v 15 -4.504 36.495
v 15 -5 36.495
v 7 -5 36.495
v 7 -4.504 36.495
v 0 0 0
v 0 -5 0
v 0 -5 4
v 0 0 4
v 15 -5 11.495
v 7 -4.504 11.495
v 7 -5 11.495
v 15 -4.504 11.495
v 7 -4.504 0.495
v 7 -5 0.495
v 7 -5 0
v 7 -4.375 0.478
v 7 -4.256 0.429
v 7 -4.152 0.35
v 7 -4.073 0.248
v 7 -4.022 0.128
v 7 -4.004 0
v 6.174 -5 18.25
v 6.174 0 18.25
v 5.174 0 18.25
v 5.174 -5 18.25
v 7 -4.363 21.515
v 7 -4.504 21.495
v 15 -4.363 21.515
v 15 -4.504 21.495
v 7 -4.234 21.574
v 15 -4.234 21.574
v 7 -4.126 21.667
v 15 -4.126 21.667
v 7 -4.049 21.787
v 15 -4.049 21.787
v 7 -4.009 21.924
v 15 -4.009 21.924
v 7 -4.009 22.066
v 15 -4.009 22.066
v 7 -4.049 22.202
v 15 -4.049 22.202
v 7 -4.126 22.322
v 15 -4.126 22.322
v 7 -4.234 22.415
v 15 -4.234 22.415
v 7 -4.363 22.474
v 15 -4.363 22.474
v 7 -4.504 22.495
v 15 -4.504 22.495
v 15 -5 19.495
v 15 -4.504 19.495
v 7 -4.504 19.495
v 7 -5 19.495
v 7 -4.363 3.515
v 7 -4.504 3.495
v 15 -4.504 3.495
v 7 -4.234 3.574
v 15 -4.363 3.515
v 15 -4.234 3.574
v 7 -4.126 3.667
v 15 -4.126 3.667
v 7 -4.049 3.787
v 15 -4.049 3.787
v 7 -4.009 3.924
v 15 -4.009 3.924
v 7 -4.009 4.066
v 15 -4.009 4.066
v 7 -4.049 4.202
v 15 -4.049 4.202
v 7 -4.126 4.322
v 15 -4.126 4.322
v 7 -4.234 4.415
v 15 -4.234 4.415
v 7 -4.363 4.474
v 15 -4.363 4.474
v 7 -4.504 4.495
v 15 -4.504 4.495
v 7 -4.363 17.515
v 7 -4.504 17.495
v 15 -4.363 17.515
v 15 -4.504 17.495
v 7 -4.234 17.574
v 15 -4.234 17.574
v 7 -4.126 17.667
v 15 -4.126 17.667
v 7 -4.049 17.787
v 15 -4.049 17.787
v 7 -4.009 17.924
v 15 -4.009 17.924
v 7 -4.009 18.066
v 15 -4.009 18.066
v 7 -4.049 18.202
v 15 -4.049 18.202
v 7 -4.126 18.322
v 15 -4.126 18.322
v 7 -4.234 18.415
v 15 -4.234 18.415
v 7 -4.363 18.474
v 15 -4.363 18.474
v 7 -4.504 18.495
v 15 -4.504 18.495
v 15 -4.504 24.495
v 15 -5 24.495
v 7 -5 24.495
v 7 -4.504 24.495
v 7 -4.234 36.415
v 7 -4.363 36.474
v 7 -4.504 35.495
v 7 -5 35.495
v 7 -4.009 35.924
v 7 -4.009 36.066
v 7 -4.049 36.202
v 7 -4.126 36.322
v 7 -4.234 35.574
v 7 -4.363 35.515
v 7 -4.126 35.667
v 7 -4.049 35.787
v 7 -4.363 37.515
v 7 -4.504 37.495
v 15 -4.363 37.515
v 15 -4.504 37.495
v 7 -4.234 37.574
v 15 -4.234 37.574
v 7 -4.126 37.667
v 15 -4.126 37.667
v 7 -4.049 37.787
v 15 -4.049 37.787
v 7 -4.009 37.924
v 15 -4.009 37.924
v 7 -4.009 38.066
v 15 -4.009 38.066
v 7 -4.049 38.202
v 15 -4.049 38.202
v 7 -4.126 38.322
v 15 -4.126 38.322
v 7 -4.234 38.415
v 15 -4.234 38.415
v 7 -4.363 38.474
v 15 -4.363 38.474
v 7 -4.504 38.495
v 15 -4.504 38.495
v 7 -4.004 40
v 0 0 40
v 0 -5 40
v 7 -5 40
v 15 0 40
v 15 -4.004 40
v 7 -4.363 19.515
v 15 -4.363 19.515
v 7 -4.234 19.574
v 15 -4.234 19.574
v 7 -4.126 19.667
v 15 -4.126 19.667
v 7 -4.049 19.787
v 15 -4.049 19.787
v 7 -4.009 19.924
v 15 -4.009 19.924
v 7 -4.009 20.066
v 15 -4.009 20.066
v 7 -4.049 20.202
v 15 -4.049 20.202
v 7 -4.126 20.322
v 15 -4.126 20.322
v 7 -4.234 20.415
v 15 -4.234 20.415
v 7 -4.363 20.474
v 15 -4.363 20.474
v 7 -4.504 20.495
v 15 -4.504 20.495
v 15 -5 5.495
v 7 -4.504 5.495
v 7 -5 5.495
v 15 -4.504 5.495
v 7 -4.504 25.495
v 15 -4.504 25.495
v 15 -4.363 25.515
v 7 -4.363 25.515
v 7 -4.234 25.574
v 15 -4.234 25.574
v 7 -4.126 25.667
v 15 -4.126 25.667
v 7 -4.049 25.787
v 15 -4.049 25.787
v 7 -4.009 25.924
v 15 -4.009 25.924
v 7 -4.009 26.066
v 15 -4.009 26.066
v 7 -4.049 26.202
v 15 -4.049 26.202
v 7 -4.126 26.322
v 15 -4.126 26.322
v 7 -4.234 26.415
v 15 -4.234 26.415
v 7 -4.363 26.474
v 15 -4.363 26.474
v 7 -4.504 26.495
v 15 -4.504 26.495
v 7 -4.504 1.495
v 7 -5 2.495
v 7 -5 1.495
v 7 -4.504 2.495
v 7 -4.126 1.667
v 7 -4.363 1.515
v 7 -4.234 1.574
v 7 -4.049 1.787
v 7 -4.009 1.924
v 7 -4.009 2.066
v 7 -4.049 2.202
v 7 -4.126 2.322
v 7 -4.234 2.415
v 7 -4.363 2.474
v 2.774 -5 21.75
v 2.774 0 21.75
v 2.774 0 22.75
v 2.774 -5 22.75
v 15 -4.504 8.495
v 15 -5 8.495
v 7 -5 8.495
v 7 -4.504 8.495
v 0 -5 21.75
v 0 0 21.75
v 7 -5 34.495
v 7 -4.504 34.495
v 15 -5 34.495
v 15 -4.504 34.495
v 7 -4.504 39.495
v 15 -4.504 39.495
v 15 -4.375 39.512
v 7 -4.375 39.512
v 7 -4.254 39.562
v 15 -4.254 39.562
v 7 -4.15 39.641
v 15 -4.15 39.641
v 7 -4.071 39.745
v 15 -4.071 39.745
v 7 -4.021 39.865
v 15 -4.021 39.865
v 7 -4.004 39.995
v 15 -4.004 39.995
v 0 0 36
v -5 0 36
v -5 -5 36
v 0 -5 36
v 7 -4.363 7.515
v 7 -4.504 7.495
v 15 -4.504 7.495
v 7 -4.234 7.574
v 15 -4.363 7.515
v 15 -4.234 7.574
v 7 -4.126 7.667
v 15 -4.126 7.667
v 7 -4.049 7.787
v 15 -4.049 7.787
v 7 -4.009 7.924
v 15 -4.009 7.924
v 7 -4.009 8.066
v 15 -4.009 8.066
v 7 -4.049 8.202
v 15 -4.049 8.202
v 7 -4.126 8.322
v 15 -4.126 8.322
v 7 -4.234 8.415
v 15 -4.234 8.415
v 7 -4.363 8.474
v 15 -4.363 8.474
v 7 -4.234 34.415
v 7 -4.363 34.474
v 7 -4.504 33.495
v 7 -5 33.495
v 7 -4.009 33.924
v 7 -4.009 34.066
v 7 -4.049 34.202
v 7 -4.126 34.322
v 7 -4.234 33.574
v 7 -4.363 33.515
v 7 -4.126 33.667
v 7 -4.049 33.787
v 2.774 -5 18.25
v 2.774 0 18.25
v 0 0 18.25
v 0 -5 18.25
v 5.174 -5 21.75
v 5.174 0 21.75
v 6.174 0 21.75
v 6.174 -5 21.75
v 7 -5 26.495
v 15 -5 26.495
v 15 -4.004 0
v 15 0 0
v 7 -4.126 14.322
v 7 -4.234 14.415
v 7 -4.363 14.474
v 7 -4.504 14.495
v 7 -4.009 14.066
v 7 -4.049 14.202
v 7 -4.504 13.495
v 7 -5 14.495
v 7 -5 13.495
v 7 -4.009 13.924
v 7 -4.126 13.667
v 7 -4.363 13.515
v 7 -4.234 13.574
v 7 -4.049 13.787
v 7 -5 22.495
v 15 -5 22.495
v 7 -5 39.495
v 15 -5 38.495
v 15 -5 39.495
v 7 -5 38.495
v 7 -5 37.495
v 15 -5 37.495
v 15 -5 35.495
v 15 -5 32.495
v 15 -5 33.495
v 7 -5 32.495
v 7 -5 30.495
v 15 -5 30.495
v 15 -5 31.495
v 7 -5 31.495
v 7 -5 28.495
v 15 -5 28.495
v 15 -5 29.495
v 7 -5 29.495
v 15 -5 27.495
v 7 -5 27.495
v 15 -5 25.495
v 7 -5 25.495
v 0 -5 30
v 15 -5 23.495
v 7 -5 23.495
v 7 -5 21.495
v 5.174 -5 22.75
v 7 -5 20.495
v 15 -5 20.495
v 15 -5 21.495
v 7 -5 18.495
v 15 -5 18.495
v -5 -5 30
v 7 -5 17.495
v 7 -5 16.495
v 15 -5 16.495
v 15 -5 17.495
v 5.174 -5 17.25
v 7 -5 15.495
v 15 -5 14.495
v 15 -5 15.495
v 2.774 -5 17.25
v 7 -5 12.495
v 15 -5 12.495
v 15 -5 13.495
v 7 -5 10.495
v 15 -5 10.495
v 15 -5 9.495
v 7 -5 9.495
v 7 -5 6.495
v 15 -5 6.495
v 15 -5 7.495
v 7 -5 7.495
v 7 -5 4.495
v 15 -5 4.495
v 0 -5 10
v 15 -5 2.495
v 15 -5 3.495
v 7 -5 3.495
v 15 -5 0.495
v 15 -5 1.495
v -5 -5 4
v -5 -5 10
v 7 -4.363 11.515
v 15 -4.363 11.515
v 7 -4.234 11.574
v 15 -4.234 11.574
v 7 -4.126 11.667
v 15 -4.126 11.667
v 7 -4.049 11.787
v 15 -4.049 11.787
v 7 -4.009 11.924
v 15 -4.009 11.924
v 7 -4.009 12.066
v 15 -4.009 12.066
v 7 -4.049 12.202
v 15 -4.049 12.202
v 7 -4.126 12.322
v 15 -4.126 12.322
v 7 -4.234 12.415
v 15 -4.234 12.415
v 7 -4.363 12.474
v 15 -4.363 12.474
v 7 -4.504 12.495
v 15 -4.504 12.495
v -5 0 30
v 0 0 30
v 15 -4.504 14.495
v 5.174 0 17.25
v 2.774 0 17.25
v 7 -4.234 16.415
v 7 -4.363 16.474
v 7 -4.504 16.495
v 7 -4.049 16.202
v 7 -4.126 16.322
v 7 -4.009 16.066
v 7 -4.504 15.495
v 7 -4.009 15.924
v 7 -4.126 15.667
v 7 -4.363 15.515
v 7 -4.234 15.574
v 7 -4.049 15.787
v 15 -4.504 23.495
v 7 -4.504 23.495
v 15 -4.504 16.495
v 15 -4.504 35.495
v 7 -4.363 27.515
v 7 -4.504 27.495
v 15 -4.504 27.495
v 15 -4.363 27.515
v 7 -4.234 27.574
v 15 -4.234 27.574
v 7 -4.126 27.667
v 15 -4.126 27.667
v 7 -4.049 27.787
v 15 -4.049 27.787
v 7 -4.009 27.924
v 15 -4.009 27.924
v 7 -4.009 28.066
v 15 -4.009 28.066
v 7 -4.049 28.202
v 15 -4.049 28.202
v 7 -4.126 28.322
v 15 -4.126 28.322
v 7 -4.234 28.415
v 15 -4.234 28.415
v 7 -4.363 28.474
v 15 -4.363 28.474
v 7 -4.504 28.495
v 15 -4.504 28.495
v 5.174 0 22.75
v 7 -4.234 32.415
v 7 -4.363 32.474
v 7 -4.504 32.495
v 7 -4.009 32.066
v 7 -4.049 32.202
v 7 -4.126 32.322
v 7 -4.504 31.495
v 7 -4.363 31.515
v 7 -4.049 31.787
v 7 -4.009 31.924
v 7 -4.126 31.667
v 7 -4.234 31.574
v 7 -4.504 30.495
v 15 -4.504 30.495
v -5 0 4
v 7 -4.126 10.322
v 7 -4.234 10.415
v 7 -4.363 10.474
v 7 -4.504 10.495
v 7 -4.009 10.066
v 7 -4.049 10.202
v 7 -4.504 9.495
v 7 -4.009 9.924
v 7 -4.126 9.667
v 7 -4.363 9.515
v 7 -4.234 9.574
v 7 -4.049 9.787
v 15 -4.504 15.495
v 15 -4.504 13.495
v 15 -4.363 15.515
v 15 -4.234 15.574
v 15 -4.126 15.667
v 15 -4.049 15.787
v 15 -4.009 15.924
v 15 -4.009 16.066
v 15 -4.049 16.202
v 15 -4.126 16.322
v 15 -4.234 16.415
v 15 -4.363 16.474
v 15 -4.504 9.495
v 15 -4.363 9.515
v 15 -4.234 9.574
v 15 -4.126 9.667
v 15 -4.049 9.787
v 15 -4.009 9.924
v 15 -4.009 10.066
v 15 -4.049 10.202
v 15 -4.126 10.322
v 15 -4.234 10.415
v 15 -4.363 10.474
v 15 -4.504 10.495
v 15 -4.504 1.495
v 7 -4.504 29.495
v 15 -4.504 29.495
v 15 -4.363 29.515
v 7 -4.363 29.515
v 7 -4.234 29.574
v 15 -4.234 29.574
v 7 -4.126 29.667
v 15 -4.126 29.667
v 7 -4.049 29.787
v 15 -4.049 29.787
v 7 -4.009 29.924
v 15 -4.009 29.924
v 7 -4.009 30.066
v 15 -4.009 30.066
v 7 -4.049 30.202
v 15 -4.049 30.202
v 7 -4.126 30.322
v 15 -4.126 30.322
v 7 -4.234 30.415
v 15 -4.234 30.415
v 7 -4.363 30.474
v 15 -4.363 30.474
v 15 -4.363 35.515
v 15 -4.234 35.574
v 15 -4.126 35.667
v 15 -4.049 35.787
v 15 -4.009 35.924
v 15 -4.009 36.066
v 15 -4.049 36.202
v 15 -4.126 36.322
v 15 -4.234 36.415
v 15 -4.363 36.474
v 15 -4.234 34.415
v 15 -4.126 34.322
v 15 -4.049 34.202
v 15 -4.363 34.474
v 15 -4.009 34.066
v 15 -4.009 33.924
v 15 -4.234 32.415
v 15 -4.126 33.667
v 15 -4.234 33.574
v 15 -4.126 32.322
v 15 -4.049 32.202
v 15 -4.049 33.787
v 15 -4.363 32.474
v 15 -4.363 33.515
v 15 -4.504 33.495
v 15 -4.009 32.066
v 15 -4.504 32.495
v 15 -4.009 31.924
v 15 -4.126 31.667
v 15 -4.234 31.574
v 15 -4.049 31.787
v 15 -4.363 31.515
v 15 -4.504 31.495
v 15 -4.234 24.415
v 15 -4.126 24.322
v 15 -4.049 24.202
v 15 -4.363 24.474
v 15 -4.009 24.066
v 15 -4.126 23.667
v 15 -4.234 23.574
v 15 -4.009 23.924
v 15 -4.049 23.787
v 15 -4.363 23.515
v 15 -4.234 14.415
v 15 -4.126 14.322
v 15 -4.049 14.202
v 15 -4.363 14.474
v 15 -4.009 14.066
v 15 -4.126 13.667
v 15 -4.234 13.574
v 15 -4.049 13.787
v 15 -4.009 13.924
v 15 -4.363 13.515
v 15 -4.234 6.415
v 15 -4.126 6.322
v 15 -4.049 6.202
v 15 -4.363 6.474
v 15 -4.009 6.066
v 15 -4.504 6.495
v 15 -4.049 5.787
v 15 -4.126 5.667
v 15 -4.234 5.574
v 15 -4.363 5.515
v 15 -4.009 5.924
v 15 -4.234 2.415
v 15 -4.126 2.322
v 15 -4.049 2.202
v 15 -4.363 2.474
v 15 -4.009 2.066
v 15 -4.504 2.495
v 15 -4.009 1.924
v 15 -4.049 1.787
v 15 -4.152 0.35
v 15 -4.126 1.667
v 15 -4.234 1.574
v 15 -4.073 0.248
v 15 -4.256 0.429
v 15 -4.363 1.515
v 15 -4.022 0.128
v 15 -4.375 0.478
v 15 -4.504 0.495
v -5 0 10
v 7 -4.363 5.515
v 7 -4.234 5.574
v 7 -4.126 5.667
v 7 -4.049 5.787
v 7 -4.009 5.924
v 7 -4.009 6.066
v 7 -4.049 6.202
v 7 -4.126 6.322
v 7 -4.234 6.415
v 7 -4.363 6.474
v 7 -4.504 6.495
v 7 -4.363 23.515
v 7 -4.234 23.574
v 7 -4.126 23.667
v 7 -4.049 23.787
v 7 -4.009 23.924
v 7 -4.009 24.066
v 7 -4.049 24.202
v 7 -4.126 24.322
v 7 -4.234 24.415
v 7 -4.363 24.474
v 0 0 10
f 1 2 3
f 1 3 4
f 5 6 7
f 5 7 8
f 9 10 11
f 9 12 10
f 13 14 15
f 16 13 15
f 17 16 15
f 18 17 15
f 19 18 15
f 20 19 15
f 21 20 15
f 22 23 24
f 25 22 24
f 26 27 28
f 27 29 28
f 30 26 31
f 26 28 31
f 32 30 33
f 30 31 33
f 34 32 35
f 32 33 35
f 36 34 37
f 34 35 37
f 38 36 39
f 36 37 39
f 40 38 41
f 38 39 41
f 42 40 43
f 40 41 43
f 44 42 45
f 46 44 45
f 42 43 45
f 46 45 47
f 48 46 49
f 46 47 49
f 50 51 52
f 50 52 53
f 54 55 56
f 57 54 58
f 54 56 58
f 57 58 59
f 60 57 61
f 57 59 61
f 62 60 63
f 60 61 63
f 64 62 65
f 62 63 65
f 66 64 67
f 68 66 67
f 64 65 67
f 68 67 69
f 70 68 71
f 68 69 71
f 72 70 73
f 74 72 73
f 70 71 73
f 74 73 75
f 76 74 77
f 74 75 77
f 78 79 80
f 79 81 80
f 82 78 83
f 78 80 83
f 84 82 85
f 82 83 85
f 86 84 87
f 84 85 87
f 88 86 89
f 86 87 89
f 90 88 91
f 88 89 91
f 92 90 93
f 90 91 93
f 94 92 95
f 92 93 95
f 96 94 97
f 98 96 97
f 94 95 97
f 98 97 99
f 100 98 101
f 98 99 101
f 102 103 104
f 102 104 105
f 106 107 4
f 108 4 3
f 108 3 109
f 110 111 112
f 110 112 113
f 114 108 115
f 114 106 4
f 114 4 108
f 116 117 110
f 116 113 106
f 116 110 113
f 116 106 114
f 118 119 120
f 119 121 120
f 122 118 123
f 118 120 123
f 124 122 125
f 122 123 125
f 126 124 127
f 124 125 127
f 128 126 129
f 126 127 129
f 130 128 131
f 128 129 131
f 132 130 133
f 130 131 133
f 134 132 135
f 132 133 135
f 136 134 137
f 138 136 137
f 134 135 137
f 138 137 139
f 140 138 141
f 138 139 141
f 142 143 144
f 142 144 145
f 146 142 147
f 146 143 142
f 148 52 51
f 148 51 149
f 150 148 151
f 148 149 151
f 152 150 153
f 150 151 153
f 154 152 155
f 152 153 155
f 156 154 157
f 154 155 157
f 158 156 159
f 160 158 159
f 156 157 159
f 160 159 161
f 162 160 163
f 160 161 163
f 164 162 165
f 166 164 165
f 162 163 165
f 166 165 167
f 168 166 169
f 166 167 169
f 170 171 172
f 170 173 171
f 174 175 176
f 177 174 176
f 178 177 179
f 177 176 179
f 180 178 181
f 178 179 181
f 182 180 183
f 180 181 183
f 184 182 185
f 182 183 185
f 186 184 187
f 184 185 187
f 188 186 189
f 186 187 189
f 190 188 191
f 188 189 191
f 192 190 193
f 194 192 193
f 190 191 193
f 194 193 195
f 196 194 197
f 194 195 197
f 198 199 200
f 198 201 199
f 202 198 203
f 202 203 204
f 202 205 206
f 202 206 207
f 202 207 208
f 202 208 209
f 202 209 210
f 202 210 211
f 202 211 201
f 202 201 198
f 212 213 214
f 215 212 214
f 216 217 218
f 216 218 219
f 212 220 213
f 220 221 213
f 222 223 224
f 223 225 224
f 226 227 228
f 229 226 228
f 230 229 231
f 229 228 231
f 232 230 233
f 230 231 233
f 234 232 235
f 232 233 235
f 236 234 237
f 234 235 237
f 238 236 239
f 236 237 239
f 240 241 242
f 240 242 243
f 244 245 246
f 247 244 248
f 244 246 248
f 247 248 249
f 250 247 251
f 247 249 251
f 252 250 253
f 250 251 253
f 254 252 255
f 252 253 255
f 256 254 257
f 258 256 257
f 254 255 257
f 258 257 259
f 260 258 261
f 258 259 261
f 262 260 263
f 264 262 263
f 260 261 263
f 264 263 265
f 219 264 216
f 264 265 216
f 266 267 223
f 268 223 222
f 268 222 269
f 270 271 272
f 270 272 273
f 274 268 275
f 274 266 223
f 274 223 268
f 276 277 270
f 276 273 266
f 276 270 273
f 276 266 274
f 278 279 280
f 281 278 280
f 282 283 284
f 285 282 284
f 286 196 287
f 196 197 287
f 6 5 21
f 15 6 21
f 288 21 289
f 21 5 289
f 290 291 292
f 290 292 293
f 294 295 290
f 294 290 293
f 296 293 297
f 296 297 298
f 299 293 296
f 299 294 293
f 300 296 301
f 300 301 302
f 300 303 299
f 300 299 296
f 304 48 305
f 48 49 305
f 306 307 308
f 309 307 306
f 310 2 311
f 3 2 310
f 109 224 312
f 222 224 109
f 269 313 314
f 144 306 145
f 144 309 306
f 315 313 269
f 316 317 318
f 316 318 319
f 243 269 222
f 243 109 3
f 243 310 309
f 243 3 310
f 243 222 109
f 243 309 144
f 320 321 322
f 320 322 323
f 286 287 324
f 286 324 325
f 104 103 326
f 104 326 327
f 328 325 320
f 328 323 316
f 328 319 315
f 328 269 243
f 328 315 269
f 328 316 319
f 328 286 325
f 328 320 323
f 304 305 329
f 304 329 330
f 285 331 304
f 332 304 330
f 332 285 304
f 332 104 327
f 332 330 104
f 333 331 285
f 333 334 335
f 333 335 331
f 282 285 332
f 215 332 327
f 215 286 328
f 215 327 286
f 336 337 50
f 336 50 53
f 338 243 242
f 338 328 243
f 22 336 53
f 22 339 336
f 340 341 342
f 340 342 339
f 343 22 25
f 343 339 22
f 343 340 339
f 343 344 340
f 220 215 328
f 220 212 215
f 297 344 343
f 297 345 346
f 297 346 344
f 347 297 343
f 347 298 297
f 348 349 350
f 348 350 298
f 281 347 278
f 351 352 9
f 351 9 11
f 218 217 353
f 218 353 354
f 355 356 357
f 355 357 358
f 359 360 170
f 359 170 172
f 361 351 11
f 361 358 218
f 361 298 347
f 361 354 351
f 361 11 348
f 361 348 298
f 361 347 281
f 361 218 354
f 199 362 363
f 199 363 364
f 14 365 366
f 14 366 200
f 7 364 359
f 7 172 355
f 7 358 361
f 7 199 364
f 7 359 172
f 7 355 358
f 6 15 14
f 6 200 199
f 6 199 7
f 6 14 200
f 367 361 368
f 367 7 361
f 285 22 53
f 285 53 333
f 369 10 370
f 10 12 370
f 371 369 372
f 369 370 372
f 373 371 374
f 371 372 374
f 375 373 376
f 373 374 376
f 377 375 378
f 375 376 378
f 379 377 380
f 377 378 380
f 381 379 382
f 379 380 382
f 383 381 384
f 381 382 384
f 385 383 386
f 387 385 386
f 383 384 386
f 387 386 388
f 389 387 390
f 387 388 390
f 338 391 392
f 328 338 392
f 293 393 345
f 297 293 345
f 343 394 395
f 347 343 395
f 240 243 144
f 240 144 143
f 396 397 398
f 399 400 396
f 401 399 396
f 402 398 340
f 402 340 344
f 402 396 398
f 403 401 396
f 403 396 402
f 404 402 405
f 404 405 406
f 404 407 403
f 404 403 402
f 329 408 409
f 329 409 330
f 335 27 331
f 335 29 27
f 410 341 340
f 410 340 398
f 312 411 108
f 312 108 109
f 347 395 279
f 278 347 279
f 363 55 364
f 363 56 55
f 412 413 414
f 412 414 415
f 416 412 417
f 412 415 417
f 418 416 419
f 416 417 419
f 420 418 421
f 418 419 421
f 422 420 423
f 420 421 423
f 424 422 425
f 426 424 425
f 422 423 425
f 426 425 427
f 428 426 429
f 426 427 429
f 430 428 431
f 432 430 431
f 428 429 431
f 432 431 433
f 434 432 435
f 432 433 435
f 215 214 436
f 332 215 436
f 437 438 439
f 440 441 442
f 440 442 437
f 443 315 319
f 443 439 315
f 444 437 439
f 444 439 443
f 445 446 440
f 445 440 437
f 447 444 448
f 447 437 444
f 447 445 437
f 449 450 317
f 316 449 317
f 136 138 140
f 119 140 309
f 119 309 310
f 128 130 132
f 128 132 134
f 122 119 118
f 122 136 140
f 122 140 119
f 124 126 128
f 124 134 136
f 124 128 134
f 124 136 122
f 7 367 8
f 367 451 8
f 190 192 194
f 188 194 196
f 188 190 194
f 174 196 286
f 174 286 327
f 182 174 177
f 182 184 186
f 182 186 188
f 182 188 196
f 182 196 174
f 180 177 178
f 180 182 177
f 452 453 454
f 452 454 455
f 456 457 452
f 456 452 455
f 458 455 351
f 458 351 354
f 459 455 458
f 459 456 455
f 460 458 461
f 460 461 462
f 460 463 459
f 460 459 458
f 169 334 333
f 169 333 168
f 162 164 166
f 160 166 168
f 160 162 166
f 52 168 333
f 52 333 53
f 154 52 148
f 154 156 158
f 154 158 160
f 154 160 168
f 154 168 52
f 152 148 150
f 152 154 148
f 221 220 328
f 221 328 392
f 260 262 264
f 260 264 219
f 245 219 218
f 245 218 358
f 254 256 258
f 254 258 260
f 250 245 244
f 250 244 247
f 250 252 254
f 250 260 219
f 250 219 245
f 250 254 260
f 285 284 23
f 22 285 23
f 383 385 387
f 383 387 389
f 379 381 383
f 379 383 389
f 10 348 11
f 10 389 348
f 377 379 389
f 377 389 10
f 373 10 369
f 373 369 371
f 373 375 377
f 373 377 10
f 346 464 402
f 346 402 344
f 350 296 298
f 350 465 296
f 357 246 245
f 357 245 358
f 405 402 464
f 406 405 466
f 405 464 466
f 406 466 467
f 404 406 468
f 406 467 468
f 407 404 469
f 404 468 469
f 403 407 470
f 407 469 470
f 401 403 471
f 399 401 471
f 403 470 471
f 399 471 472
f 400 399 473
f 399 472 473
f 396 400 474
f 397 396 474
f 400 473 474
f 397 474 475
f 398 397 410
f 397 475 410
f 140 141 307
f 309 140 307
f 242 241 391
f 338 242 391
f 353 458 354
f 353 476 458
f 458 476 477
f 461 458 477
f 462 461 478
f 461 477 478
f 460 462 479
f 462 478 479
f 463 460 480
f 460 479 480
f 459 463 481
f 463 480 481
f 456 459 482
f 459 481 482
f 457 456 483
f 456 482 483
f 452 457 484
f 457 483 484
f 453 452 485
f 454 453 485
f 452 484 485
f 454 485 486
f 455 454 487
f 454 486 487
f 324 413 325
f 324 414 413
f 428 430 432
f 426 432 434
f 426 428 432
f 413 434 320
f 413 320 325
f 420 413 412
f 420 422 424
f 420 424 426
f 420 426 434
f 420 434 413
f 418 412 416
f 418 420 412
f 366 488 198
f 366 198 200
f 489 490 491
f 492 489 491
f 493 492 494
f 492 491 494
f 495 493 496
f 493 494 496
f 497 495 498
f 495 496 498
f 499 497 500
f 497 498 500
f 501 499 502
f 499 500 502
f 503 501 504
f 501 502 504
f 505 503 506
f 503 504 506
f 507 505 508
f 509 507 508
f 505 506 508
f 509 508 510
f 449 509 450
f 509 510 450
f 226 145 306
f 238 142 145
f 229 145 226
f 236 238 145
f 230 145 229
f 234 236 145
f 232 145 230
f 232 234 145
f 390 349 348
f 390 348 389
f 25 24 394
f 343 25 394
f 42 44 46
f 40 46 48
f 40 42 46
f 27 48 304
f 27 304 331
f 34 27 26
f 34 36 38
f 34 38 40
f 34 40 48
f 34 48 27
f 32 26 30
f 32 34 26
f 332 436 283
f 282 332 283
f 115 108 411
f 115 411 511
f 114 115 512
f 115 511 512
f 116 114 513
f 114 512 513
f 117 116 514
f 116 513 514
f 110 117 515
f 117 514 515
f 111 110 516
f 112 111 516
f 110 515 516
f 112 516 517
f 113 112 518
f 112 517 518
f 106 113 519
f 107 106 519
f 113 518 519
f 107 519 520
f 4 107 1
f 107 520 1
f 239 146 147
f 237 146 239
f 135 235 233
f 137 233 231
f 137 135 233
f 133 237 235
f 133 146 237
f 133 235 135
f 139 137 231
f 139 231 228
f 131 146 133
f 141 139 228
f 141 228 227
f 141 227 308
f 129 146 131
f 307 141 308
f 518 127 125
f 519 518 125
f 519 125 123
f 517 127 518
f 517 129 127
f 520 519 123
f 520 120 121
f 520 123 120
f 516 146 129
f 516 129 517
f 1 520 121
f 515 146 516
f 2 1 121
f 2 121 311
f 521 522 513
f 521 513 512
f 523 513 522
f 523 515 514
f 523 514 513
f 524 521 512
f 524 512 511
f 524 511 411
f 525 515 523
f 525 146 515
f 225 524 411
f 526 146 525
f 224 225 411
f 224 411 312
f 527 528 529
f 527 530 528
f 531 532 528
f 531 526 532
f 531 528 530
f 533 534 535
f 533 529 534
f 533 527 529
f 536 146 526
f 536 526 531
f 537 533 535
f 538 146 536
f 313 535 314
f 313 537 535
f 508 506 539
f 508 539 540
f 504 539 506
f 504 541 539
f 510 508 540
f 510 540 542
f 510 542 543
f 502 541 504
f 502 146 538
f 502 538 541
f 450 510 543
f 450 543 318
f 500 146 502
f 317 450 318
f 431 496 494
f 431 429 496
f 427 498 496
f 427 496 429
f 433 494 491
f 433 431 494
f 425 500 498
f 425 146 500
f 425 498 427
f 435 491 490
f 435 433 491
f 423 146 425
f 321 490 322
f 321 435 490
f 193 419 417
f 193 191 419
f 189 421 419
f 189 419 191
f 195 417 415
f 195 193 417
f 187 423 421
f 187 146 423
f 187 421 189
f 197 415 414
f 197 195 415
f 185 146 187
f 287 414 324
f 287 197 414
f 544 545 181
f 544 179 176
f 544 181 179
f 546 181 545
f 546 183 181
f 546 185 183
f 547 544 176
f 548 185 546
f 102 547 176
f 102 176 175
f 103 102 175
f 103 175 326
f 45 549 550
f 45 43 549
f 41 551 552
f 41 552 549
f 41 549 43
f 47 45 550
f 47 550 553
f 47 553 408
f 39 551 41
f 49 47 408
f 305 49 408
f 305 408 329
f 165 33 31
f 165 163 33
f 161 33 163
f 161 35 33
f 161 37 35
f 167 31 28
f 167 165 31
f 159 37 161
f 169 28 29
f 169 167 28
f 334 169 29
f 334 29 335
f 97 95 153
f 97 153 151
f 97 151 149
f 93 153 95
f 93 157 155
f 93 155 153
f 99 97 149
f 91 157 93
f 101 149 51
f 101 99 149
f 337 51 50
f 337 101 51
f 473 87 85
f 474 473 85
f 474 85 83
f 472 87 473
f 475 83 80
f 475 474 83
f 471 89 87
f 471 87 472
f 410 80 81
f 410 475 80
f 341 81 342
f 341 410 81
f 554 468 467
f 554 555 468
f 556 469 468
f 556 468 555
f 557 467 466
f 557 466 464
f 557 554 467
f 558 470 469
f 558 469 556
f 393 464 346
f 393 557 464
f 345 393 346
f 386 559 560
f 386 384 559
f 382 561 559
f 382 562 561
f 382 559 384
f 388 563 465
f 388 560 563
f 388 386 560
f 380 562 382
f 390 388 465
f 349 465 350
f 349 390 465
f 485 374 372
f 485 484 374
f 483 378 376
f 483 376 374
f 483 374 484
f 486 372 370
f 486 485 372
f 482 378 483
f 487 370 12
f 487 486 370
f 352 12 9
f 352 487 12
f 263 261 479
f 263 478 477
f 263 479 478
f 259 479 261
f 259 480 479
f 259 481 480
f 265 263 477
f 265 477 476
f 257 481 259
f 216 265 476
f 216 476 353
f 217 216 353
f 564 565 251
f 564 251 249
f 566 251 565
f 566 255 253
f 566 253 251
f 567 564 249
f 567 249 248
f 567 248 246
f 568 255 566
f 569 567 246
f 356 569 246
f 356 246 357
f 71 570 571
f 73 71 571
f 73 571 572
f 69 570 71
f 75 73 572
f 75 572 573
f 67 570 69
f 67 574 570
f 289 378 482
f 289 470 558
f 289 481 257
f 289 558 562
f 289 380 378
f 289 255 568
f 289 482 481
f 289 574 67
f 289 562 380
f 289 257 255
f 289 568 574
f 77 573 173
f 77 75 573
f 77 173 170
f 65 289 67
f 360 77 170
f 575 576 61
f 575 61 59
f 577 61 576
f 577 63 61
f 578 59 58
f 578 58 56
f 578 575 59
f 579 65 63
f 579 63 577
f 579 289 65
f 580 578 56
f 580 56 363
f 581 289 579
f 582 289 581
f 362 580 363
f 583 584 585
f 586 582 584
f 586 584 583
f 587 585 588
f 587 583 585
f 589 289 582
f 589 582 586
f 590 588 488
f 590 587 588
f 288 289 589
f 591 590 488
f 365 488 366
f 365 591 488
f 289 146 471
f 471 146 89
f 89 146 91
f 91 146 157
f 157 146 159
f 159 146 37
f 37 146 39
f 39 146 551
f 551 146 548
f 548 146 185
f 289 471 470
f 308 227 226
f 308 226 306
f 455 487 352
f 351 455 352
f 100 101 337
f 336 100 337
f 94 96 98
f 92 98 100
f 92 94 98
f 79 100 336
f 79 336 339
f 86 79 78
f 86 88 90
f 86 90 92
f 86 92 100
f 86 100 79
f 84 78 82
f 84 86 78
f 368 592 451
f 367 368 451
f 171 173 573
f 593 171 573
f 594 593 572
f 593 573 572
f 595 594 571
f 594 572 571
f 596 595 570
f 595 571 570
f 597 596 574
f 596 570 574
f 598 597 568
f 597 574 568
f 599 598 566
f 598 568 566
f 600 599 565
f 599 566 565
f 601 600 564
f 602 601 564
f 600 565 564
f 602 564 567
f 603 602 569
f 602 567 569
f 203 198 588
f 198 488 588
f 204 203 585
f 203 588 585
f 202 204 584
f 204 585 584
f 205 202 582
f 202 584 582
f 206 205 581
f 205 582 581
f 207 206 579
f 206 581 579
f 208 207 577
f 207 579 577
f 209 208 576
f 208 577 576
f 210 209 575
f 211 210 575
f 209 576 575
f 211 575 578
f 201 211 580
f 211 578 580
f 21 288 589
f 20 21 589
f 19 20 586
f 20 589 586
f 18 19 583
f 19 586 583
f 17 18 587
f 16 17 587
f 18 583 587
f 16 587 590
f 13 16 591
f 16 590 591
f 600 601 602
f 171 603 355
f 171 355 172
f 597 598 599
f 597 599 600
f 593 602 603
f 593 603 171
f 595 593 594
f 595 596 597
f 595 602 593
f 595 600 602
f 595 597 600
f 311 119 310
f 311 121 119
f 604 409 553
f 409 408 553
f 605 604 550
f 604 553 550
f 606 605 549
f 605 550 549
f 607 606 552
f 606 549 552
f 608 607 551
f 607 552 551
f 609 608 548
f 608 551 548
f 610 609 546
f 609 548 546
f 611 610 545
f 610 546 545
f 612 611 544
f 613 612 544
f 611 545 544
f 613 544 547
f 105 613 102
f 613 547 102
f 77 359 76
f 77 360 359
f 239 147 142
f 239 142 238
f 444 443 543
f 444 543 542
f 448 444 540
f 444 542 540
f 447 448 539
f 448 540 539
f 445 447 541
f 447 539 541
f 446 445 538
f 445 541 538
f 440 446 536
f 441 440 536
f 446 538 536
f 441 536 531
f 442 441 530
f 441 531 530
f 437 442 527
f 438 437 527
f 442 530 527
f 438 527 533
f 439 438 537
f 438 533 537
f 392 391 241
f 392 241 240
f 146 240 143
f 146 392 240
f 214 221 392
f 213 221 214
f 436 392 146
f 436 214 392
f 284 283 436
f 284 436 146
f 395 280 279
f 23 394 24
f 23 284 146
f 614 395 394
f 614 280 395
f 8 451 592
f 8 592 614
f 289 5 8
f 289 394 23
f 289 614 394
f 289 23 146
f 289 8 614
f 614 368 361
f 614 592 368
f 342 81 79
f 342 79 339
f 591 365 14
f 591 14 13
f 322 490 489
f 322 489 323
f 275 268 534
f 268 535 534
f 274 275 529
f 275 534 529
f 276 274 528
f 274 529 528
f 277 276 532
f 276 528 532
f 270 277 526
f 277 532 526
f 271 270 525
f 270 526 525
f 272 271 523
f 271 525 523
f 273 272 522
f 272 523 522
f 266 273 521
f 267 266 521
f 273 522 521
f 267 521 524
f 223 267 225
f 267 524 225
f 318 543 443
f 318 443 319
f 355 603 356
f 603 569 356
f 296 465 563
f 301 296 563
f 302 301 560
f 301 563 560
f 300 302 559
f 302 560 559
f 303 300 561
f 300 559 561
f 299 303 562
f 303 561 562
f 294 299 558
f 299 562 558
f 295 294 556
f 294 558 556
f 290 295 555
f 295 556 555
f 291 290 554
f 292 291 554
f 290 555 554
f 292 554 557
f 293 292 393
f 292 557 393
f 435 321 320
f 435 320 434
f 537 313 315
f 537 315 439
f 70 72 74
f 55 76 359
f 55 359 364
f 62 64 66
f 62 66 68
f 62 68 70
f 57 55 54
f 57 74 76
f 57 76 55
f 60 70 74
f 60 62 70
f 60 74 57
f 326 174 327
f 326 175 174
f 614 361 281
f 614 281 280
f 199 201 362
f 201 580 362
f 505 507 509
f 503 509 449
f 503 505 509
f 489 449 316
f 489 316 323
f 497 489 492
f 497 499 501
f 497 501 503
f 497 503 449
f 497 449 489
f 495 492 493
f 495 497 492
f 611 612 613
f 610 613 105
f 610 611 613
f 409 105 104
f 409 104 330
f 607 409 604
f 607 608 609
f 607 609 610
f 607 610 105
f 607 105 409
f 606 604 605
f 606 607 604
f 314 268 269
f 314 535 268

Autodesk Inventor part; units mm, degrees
ref_plane "YZ Plane" through (0, 0, 0) normal (1, 0, 0) x (0, 1, 0)
ref_plane "XZ Plane" through (0, 0, 0) normal (0, 1, 0) x (-1, 0, 0)
ref_plane "XY Plane" through (0, 0, 0) normal (0, 0, 1) x (1, 0, 0)
sketch "Boceto1" plane through (0, 0, 0) normal (0, 0, 1) x (1, 0, 0)
  line L0 (0, 0) -> (15, 0)
  line L1 (15, 0) -> (15, -5)
  line L2 (15, -5) -> (0, -5)
  line L3 (0, -5) -> (0, 0)
extrude "Extrusión1" add sketch "Boceto1" along normal blind 40
sketch "Boceto2" plane through (0, 0, 0) normal (0, 1, 0) x (1, 0, 0)
  line L0 (0, -40) -> (15, -40) projected
  line L1 (6.174, -21.75) -> (6.174, -18.25)
  line L2 (2.774, -22.75) -> (5.174, -22.75)
  line L3 (5.174, -17.25) -> (2.774, -17.25)
  line L4 (6.174, -18.25) -> (5.174, -18.25)
  line L5 (2.774, -18.25) -> (0, -18.25)
  line L6 (2.774, -17.25) -> (2.774, -18.25)
  line L7 (2.774, -21.75) -> (2.774, -22.75)
  line L8 (5.174, -22.75) -> (5.174, -21.75)
  line L9 (5.174, -18.25) -> (5.174, -17.25)
  line L10 (0, -21.75) -> (2.774, -21.75)
  line L11 (5.174, -21.75) -> (6.174, -21.75)
  line L12 (0, -10) -> (-5, -10)
  line L13 (-5, -10) -> (-5, -4)
  line L14 (-5, -4) -> (0, -4)
  line L15 (0, -4) -> (0, -10)
  line L16 (0, -36) -> (-5, -36)
  line L17 (-5, -36) -> (-5, -30)
  line L18 (-5, -30) -> (0, -30)
  line L19 (0, -30) -> (0, -36)
  line L20 (0, 0) -> (0, -40) projected
  dimension "d7" = 3.5
  dimension "d8" = 2.4
  dimension "d12" = 18.25
  dimension "d14" = 6
  dimension "d15" = 5
  dimension "d16" = 5
  dimension "d17" = 6
  dimension "d18" = 4
  dimension "d19" = 20
extrude "Extrusión3" cut sketch "Boceto2" against normal through all
sketch "Boceto3" plane through (0, 0, 0) normal (0, 1, 0) x (1, 0, 0)
  line L0 (2.774, -21.75) -> (0, -21.75) projected
  line L1 (0, -18.25) -> (2.774, -18.25) projected
  line L2 (-5, -10) -> (-5, -4)
  line L3 (-5, -36) -> (-5, -30)
  line L4 (-5, -36) -> (0, -36)
  line L5 (-5, -30) -> (0, -30)
  line L6 (-5, -4) -> (0, -4)
  line L7 (-5, -10) -> (0, -10)
  line L8 (0, -4) -> (0, -10)
  line L9 (0, -30) -> (0, -36)
extrude "Extrusión4" add sketch "Boceto3" against normal blind 5
sketch "Boceto4" plane through (15, -5, 0) normal (1, 0, 0) x (0, 0, -1)
  arc A0 (-37.4947, 0.496) -> (-38.4947, 0.496) centre (-37.9947, 0.496) ccw
  line L0 (-38.4947, 0.496) -> (-38.4947, -0.004)
  line L1 (-37.4947, 0.496) -> (-37.4947, -0.004)
  line L2 (-39.4947, 0.496) -> (-39.4947, -0.004)
  arc A1 (-39.4947, 0.496) -> (-39.9947, 0.996) centre (-39.9947, 0.496) ccw
  arc A2 (-35.9947, 0.996) -> (-36.4947, 0.496) centre (-35.9947, 0.496) ccw
  line L3 (-36.4947, -0.004) -> (-36.4947, 0.496)
  arc A3 (-33.4947, 0.496) -> (-34.4947, 0.496) centre (-33.9947, 0.496) ccw
  line L4 (-34.4947, 0.496) -> (-34.4947, -0.004)
  line L5 (-33.4947, 0.496) -> (-33.4947, -0.004)
  line L6 (-35.4947, 0.496) -> (-35.4947, -0.004)
  arc A4 (-35.4947, 0.496) -> (-35.9947, 0.996) centre (-35.9947, 0.496) ccw
  arc A5 (-31.9947, 0.996) -> (-32.4947, 0.496) centre (-31.9947, 0.496) ccw
  line L7 (-32.4947, -0.004) -> (-32.4947, 0.496)
  arc A6 (-29.4947, 0.496) -> (-30.4947, 0.496) centre (-29.9947, 0.496) ccw
  line L8 (-30.4947, 0.496) -> (-30.4947, -0.004)
  line L9 (-29.4947, 0.496) -> (-29.4947, -0.004)
  line L10 (-31.4947, 0.496) -> (-31.4947, -0.004)
  arc A7 (-31.4947, 0.496) -> (-31.9947, 0.996) centre (-31.9947, 0.496) ccw
  arc A8 (-27.9947, 0.996) -> (-28.4947, 0.496) centre (-27.9947, 0.496) ccw
  line L11 (-28.4947, -0.004) -> (-28.4947, 0.496)
  line L12 (-26.4947, 0.496) -> (-26.4947, -0.004)
  line L13 (-25.4947, 0.496) -> (-25.4947, -0.004)
  line L14 (-27.4947, 0.496) -> (-27.4947, -0.004)
  line L15 (-24.4947, -0.004) -> (-24.4947, 0.496)
  arc A9 (-23.9947, 0.996) -> (-24.4947, 0.496) centre (-23.9947, 0.496) ccw
  arc A10 (-25.4947, 0.496) -> (-26.4947, 0.496) centre (-25.9947, 0.496) ccw
  arc A11 (-27.4947, 0.496) -> (-27.9947, 0.996) centre (-27.9947, 0.496) ccw
  arc A12 (-21.4947, 0.496) -> (-22.4947, 0.496) centre (-21.9947, 0.496) ccw
  line L16 (-22.4947, 0.496) -> (-22.4947, -0.004)
  line L17 (-21.4947, 0.496) -> (-21.4947, -0.004)
  line L18 (-23.4947, 0.496) -> (-23.4947, -0.004)
  arc A13 (-23.4947, 0.496) -> (-23.9947, 0.996) centre (-23.9947, 0.496) ccw
  arc A14 (-19.9947, 0.996) -> (-20.4947, 0.496) centre (-19.9947, 0.496) ccw
  line L19 (-20.4947, -0.004) -> (-20.4947, 0.496)
  line L20 (-18.4947, 0.496) -> (-18.4947, -0.004)
  line L21 (-17.4947, 0.496) -> (-17.4947, -0.004)
  line L22 (-19.4947, 0.496) -> (-19.4947, -0.004)
  line L23 (-16.4947, -0.004) -> (-16.4947, 0.496)
  arc A15 (-15.9947, 0.996) -> (-16.4947, 0.496) centre (-15.9947, 0.496) ccw
  arc A16 (-17.4947, 0.496) -> (-18.4947, 0.496) centre (-17.9947, 0.496) ccw
  arc A17 (-19.4947, 0.496) -> (-19.9947, 0.996) centre (-19.9947, 0.496) ccw
  arc A18 (-15.4947, 0.496) -> (-15.9947, 0.996) centre (-15.9947, 0.496) ccw
  line L24 (-14.4947, 0.496) -> (-14.4947, -0.004)
  arc A19 (-13.4947, 0.496) -> (-14.4947, 0.496) centre (-13.9947, 0.496) ccw
  line L25 (-13.4947, 0.496) -> (-13.4947, -0.004)
  line L26 (-12.4947, -0.004) -> (-12.4947, 0.496)
  arc A20 (-11.9947, 0.996) -> (-12.4947, 0.496) centre (-11.9947, 0.496) ccw
  arc A21 (-11.4947, 0.496) -> (-11.9947, 0.996) centre (-11.9947, 0.496) ccw
  line L27 (-11.4947, 0.496) -> (-11.4947, -0.004)
  line L28 (-15.4947, 0.496) -> (-15.4947, -0.004)
  line L29 (-10.4947, 0.496) -> (-10.4947, -0.004)
  arc A22 (-9.4947, 0.496) -> (-10.4947, 0.496) centre (-9.9947, 0.496) ccw
  line L30 (-9.4947, 0.496) -> (-9.4947, -0.004)
  line L31 (-8.4947, -0.004) -> (-8.4947, 0.496)
  arc A23 (-7.9947, 0.996) -> (-8.4947, 0.496) centre (-7.9947, 0.496) ccw
  arc A24 (0.0053, 0.996) -> (-0.4947, 0.496) centre (0.0053, 0.496) ccw
  line L32 (-0.4947, -0.004) -> (-0.4947, 0.496)
  arc A25 (-5.4947, 0.496) -> (-6.4947, 0.496) centre (-5.9947, 0.496) ccw
  line L33 (-6.4947, 0.496) -> (-6.4947, -0.004)
  line L34 (-7.4947, 0.496) -> (-7.4947, -0.004)
  arc A26 (-7.4947, 0.496) -> (-7.9947, 0.996) centre (-7.9947, 0.496) ccw
  line L35 (-5.4947, 0.496) -> (-5.4947, -0.004)
  line L36 (-4.4947, -0.004) -> (-4.4947, 0.496)
  arc A27 (-3.9947, 0.996) -> (-4.4947, 0.496) centre (-3.9947, 0.496) ccw
  arc A28 (-3.4947, 0.496) -> (-3.9947, 0.996) centre (-3.9947, 0.496) ccw
  line L37 (-3.4947, 0.496) -> (-3.4947, -0.004)
  line L38 (-2.4947, 0.496) -> (-2.4947, -0.004)
  arc A29 (-1.4947, 0.496) -> (-2.4947, 0.496) centre (-1.9947, 0.496) ccw
  line L39 (-1.4947, 0.496) -> (-1.4947, -0.004)
  line L40 (-0.4947, -0.004) -> (0.0053, -0.004)
  line L41 (-2.4947, -0.004) -> (-1.4947, -0.004)
  line L42 (-4.4947, -0.004) -> (-3.4947, -0.004)
  line L43 (-6.4947, -0.004) -> (-5.4947, -0.004)
  line L44 (-8.4947, -0.004) -> (-7.4947, -0.004)
  line L45 (-10.4947, -0.004) -> (-9.4947, -0.004)
  line L46 (-12.4947, -0.004) -> (-11.4947, -0.004)
  line L47 (-14.4947, -0.004) -> (-13.4947, -0.004)
  line L48 (-16.4947, -0.004) -> (-15.4947, -0.004)
  line L49 (-18.4947, -0.004) -> (-17.4947, -0.004)
  line L50 (-24.4947, -0.004) -> (-23.4947, -0.004)
  line L51 (-22.4947, -0.004) -> (-21.4947, -0.004)
  line L52 (-20.4947, -0.004) -> (-19.4947, -0.004)
  line L53 (-26.4947, -0.004) -> (-25.4947, -0.004)
  line L54 (-28.4947, -0.004) -> (-27.4947, -0.004)
  line L55 (-30.4947, -0.004) -> (-29.4947, -0.004)
  line L56 (-32.4947, -0.004) -> (-31.4947, -0.004)
  line L57 (-34.4947, -0.004) -> (-33.4947, -0.004)
  line L58 (-36.4947, -0.004) -> (-35.4947, -0.004)
  line L59 (-39.9947, -0.004) -> (-39.4947, -0.004)
  line L60 (-38.4947, -0.004) -> (-37.4947, -0.004)
  line L61 (0.0053, -0.004) -> (0.0053, 0.996)
  line L62 (-39.9947, -0.004) -> (-40.0154, -0.004)
  line L63 (-40.0154, -0.004) -> (-40.0154, 0.996)
  line L64 (-40.0154, 0.996) -> (-39.9947, 0.996)
  point P0 (-32.9947, 0.496)
  point P1 (-30.9947, 0.496)
  point P2 (-28.9947, 0.496)
  point P3 (-24.9947, 0.496)
  point P4 (-26.9947, 0.496)
  point P5 (-22.9947, 0.496)
  point P6 (-20.9947, 0.496)
  point P7 (-16.9947, 0.496)
  point P8 (-18.9947, 0.496)
  point P9 (-10.9947, 0.496)
  point P10 (-8.9947, 0.496)
  point P11 (-12.9947, 0.496)
  point P12 (-14.9947, 0.496)
  point P13 (-2.9947, 0.496)
  point P14 (-0.9947, 0.496)
  point P15 (-4.9947, 0.496)
  point P16 (-6.9947, 0.496)
  dimension "d49" = 4
  dimension "d50" = 8
  dimension "d51" = 4
extrude "Extrusión5" cut sketch "Boceto4" against normal blind 8
properties part number "brida correas eje y"
